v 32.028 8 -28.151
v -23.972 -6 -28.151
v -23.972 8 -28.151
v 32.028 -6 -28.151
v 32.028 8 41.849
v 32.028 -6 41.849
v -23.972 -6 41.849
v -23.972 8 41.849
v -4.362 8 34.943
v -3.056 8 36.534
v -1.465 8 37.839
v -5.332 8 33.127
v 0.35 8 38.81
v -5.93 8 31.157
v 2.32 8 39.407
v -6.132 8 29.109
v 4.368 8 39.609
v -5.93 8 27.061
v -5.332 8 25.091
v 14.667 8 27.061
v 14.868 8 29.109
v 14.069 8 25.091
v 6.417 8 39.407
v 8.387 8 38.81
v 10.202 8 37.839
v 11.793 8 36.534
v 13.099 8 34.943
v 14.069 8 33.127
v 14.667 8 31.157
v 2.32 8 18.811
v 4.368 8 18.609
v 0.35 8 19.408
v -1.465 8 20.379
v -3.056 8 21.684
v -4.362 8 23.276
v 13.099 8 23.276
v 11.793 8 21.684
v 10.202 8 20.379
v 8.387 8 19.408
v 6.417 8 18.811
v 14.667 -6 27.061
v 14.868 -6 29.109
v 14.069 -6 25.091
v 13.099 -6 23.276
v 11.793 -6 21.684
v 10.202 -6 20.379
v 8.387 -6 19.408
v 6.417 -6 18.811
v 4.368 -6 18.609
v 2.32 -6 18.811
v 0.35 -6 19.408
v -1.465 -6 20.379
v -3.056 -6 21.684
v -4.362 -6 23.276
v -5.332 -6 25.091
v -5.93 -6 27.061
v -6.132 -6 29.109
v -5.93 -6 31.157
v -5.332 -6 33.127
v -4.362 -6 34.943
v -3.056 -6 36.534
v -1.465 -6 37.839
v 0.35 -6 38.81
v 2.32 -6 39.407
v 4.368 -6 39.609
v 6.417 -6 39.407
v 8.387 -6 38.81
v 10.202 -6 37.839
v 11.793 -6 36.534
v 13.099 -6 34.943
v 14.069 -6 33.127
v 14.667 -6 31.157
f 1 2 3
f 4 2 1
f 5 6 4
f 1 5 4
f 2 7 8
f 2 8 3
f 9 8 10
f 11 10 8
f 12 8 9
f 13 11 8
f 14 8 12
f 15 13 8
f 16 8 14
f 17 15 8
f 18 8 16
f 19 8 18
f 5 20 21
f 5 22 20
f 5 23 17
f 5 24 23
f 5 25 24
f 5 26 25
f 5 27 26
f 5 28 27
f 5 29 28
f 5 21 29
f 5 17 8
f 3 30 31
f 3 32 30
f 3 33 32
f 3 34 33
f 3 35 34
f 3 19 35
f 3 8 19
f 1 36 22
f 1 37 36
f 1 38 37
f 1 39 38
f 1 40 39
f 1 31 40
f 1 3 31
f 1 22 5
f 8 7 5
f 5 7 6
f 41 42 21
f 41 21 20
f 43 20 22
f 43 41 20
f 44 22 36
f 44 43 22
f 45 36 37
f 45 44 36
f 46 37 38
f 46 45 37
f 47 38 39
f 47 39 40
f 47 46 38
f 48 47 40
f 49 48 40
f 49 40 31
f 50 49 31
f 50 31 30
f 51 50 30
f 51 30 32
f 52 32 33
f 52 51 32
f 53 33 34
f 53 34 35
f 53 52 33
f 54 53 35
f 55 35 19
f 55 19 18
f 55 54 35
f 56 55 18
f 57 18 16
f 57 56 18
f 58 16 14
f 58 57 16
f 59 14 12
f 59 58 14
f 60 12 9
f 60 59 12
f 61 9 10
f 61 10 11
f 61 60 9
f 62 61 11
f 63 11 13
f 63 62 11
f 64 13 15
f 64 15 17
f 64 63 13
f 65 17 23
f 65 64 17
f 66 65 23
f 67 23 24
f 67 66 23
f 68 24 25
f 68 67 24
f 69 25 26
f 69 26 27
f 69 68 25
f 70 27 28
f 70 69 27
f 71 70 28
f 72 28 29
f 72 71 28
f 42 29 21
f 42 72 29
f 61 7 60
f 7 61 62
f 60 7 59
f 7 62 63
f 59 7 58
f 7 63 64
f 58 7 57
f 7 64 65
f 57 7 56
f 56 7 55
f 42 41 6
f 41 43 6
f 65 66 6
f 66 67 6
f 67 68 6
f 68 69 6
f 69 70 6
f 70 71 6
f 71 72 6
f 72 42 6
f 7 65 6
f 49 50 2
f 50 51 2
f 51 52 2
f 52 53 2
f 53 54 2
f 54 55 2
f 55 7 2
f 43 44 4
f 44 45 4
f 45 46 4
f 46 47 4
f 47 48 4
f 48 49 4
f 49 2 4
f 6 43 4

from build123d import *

# Parameters (mm, degrees)
CROQUIS1_W              = 8
CROQUIS1_H              = 10
CROQUIS1_R              = 1.5
SALIENTE_EXTRUIR1_DEPTH = 2
ESCALA1_SCALE           = 7


with BuildPart() as part:
    # Croquis1 → Saliente-Extruir1 (new body)
    with BuildSketch(Plane(origin=(0, 0, 0), x_dir=(1, 0, 0), z_dir=(0, 1, 0))):
        with Locations((4, -5)):
            Rectangle(CROQUIS1_W, CROQUIS1_H)
        with Locations((4.048599745, -8.17997322)):
            Circle(CROQUIS1_R, mode=Mode.SUBTRACT)
    extrude(amount=SALIENTE_EXTRUIR1_DEPTH)


with BuildPart() as part_1:
    # Escala1: scaled about (3.995289666, 1, 4.691793918)
    add(part.part.scale(ESCALA1_SCALE).moved(Location((-23.971737996, -6, -28.150763508))))


solid = part_1.part
